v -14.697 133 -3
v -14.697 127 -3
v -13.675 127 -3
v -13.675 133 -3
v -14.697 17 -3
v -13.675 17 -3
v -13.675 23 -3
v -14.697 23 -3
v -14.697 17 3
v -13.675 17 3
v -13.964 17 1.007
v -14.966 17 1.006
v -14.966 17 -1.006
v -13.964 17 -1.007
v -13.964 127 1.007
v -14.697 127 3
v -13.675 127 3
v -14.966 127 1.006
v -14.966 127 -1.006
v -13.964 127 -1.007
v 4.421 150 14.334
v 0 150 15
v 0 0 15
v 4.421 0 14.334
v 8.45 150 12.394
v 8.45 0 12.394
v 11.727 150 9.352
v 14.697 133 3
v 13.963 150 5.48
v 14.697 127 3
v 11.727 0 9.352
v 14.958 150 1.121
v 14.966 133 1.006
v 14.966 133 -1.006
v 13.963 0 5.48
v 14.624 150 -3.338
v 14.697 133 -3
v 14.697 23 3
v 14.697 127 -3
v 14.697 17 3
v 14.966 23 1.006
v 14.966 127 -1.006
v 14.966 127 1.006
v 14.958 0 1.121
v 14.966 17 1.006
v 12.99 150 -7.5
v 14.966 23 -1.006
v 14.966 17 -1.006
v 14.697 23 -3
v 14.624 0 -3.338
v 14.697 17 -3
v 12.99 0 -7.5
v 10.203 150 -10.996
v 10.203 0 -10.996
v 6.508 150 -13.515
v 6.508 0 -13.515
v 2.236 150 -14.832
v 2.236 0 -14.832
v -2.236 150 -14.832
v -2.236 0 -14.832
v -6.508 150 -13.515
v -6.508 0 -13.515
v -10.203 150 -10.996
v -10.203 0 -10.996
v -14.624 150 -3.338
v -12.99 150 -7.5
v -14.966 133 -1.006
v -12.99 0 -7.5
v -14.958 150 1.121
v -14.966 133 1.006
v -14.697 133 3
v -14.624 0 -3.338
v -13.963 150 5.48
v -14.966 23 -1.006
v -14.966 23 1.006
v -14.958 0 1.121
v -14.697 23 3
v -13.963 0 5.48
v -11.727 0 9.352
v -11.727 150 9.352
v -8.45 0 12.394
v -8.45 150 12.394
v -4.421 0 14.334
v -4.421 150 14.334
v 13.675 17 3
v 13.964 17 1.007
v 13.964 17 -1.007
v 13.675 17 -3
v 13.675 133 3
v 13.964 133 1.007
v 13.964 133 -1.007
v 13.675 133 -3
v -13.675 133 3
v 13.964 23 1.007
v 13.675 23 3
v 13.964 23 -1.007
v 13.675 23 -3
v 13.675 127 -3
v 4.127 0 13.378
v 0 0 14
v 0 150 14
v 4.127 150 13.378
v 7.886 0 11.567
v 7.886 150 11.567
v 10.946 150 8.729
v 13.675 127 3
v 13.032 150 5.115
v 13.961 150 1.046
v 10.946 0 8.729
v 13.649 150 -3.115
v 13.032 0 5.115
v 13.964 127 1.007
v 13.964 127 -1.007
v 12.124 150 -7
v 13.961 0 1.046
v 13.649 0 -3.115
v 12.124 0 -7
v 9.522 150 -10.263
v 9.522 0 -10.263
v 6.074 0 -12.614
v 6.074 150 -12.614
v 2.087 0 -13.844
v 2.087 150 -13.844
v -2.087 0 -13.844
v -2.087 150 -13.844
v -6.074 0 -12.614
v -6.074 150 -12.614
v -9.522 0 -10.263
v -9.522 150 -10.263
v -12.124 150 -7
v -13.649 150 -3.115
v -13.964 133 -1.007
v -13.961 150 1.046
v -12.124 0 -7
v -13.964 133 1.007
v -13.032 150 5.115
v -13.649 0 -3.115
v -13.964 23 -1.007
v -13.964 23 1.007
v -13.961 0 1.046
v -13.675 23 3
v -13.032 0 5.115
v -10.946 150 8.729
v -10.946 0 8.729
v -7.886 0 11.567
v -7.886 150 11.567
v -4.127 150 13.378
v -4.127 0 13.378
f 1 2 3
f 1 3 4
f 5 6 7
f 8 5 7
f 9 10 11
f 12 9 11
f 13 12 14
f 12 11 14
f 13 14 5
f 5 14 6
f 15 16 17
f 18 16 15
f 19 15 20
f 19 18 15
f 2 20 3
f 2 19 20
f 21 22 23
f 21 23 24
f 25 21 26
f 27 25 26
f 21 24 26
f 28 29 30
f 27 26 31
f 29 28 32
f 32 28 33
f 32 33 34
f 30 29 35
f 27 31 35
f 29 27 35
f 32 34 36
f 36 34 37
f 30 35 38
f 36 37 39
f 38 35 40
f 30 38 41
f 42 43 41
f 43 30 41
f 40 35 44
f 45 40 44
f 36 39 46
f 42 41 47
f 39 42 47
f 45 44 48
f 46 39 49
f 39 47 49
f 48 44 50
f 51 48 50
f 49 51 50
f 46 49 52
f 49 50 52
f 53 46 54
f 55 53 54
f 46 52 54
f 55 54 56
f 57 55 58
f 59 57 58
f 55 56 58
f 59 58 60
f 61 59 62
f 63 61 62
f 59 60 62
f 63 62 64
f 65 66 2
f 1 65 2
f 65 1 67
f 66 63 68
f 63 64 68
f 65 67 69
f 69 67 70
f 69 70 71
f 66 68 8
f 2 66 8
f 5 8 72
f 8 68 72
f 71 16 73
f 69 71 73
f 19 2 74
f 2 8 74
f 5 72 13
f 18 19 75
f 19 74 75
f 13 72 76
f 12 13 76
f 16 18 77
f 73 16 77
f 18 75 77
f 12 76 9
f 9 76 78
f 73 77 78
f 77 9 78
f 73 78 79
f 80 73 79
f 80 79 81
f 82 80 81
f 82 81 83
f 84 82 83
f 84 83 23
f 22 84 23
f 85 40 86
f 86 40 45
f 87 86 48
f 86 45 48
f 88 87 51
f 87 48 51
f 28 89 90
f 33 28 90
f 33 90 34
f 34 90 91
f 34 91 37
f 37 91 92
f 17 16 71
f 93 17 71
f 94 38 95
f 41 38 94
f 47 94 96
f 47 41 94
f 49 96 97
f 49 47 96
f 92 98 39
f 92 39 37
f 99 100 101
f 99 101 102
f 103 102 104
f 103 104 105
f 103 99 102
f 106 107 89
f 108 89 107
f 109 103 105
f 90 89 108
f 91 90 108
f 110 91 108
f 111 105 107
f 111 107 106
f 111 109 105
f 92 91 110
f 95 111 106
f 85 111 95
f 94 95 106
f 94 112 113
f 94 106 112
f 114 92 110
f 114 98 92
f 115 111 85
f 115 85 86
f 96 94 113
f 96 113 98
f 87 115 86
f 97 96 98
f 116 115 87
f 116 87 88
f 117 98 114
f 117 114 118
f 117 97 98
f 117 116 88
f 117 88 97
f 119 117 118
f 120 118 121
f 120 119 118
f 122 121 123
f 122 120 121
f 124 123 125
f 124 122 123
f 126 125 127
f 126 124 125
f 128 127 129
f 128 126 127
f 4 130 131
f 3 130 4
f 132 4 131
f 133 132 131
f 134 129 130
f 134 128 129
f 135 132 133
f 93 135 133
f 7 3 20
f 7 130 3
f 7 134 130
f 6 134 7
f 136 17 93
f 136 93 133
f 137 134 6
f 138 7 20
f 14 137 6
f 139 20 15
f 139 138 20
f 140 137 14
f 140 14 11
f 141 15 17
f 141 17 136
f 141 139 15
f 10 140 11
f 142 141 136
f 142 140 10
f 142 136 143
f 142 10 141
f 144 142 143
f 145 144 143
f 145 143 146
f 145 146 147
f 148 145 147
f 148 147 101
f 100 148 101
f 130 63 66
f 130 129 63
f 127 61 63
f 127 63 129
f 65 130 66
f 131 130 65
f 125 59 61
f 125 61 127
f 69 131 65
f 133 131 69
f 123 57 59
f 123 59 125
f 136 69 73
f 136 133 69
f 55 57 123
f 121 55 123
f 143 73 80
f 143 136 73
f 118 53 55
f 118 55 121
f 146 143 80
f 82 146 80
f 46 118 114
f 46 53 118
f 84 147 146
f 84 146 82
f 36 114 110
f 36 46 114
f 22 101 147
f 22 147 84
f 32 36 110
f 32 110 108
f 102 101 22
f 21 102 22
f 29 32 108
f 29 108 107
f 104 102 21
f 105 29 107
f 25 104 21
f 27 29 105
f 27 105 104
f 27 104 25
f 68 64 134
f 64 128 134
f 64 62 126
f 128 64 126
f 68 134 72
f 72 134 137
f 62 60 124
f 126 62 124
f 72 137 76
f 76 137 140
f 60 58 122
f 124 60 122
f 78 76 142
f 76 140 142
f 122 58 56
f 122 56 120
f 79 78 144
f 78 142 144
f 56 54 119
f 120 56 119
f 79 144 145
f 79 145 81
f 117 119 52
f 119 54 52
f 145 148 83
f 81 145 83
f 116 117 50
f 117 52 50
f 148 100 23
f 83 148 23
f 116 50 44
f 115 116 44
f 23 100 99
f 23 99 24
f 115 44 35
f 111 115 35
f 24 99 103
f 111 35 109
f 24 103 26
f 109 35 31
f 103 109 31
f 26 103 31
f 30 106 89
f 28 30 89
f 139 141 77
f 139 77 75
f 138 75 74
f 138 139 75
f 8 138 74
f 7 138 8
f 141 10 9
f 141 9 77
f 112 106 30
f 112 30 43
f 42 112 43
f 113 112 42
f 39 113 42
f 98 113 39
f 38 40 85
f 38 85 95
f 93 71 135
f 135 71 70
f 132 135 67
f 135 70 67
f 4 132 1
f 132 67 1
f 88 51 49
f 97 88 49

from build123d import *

# Parameters (mm, degrees)
SKETCH1_R           = 15
SKETCH1_R_2         = 14
BOSS_EXTRUDE1_DEPTH = 150
SKETCH2_W           = 6
SKETCH2_H           = 6
CUT_EXTRUDE1_DEPTH  = 15


with BuildPart() as part:
    # Sketch1 → Boss-Extrude1 (new body)
    with BuildSketch(Plane(origin=(0, 0, 0), x_dir=(1, 0, 0), z_dir=(0, 1, 0))):
        with Locations(Location((0, 0, 0), (0, 0, 270))):
            Circle(SKETCH1_R)
        with Locations(Location((0, 0, 0), (0, 0, 270))):
            Circle(SKETCH1_R_2, mode=Mode.SUBTRACT)
    extrude(amount=BOSS_EXTRUDE1_DEPTH)

    # Sketch2 → Cut-Extrude1 (cut, symmetric)
    with BuildSketch(Plane(origin=(0, 0, 0), x_dir=(0, 0, -1), z_dir=(1, 0, 0))):
        with Locations((0, 130)):
            Rectangle(SKETCH2_W, SKETCH2_H)
        with Locations((0, 20)):
            Rectangle(SKETCH2_W, SKETCH2_H)
    extrude(amount=CUT_EXTRUDE1_DEPTH, both=True, mode=Mode.SUBTRACT)


solid = part.part
